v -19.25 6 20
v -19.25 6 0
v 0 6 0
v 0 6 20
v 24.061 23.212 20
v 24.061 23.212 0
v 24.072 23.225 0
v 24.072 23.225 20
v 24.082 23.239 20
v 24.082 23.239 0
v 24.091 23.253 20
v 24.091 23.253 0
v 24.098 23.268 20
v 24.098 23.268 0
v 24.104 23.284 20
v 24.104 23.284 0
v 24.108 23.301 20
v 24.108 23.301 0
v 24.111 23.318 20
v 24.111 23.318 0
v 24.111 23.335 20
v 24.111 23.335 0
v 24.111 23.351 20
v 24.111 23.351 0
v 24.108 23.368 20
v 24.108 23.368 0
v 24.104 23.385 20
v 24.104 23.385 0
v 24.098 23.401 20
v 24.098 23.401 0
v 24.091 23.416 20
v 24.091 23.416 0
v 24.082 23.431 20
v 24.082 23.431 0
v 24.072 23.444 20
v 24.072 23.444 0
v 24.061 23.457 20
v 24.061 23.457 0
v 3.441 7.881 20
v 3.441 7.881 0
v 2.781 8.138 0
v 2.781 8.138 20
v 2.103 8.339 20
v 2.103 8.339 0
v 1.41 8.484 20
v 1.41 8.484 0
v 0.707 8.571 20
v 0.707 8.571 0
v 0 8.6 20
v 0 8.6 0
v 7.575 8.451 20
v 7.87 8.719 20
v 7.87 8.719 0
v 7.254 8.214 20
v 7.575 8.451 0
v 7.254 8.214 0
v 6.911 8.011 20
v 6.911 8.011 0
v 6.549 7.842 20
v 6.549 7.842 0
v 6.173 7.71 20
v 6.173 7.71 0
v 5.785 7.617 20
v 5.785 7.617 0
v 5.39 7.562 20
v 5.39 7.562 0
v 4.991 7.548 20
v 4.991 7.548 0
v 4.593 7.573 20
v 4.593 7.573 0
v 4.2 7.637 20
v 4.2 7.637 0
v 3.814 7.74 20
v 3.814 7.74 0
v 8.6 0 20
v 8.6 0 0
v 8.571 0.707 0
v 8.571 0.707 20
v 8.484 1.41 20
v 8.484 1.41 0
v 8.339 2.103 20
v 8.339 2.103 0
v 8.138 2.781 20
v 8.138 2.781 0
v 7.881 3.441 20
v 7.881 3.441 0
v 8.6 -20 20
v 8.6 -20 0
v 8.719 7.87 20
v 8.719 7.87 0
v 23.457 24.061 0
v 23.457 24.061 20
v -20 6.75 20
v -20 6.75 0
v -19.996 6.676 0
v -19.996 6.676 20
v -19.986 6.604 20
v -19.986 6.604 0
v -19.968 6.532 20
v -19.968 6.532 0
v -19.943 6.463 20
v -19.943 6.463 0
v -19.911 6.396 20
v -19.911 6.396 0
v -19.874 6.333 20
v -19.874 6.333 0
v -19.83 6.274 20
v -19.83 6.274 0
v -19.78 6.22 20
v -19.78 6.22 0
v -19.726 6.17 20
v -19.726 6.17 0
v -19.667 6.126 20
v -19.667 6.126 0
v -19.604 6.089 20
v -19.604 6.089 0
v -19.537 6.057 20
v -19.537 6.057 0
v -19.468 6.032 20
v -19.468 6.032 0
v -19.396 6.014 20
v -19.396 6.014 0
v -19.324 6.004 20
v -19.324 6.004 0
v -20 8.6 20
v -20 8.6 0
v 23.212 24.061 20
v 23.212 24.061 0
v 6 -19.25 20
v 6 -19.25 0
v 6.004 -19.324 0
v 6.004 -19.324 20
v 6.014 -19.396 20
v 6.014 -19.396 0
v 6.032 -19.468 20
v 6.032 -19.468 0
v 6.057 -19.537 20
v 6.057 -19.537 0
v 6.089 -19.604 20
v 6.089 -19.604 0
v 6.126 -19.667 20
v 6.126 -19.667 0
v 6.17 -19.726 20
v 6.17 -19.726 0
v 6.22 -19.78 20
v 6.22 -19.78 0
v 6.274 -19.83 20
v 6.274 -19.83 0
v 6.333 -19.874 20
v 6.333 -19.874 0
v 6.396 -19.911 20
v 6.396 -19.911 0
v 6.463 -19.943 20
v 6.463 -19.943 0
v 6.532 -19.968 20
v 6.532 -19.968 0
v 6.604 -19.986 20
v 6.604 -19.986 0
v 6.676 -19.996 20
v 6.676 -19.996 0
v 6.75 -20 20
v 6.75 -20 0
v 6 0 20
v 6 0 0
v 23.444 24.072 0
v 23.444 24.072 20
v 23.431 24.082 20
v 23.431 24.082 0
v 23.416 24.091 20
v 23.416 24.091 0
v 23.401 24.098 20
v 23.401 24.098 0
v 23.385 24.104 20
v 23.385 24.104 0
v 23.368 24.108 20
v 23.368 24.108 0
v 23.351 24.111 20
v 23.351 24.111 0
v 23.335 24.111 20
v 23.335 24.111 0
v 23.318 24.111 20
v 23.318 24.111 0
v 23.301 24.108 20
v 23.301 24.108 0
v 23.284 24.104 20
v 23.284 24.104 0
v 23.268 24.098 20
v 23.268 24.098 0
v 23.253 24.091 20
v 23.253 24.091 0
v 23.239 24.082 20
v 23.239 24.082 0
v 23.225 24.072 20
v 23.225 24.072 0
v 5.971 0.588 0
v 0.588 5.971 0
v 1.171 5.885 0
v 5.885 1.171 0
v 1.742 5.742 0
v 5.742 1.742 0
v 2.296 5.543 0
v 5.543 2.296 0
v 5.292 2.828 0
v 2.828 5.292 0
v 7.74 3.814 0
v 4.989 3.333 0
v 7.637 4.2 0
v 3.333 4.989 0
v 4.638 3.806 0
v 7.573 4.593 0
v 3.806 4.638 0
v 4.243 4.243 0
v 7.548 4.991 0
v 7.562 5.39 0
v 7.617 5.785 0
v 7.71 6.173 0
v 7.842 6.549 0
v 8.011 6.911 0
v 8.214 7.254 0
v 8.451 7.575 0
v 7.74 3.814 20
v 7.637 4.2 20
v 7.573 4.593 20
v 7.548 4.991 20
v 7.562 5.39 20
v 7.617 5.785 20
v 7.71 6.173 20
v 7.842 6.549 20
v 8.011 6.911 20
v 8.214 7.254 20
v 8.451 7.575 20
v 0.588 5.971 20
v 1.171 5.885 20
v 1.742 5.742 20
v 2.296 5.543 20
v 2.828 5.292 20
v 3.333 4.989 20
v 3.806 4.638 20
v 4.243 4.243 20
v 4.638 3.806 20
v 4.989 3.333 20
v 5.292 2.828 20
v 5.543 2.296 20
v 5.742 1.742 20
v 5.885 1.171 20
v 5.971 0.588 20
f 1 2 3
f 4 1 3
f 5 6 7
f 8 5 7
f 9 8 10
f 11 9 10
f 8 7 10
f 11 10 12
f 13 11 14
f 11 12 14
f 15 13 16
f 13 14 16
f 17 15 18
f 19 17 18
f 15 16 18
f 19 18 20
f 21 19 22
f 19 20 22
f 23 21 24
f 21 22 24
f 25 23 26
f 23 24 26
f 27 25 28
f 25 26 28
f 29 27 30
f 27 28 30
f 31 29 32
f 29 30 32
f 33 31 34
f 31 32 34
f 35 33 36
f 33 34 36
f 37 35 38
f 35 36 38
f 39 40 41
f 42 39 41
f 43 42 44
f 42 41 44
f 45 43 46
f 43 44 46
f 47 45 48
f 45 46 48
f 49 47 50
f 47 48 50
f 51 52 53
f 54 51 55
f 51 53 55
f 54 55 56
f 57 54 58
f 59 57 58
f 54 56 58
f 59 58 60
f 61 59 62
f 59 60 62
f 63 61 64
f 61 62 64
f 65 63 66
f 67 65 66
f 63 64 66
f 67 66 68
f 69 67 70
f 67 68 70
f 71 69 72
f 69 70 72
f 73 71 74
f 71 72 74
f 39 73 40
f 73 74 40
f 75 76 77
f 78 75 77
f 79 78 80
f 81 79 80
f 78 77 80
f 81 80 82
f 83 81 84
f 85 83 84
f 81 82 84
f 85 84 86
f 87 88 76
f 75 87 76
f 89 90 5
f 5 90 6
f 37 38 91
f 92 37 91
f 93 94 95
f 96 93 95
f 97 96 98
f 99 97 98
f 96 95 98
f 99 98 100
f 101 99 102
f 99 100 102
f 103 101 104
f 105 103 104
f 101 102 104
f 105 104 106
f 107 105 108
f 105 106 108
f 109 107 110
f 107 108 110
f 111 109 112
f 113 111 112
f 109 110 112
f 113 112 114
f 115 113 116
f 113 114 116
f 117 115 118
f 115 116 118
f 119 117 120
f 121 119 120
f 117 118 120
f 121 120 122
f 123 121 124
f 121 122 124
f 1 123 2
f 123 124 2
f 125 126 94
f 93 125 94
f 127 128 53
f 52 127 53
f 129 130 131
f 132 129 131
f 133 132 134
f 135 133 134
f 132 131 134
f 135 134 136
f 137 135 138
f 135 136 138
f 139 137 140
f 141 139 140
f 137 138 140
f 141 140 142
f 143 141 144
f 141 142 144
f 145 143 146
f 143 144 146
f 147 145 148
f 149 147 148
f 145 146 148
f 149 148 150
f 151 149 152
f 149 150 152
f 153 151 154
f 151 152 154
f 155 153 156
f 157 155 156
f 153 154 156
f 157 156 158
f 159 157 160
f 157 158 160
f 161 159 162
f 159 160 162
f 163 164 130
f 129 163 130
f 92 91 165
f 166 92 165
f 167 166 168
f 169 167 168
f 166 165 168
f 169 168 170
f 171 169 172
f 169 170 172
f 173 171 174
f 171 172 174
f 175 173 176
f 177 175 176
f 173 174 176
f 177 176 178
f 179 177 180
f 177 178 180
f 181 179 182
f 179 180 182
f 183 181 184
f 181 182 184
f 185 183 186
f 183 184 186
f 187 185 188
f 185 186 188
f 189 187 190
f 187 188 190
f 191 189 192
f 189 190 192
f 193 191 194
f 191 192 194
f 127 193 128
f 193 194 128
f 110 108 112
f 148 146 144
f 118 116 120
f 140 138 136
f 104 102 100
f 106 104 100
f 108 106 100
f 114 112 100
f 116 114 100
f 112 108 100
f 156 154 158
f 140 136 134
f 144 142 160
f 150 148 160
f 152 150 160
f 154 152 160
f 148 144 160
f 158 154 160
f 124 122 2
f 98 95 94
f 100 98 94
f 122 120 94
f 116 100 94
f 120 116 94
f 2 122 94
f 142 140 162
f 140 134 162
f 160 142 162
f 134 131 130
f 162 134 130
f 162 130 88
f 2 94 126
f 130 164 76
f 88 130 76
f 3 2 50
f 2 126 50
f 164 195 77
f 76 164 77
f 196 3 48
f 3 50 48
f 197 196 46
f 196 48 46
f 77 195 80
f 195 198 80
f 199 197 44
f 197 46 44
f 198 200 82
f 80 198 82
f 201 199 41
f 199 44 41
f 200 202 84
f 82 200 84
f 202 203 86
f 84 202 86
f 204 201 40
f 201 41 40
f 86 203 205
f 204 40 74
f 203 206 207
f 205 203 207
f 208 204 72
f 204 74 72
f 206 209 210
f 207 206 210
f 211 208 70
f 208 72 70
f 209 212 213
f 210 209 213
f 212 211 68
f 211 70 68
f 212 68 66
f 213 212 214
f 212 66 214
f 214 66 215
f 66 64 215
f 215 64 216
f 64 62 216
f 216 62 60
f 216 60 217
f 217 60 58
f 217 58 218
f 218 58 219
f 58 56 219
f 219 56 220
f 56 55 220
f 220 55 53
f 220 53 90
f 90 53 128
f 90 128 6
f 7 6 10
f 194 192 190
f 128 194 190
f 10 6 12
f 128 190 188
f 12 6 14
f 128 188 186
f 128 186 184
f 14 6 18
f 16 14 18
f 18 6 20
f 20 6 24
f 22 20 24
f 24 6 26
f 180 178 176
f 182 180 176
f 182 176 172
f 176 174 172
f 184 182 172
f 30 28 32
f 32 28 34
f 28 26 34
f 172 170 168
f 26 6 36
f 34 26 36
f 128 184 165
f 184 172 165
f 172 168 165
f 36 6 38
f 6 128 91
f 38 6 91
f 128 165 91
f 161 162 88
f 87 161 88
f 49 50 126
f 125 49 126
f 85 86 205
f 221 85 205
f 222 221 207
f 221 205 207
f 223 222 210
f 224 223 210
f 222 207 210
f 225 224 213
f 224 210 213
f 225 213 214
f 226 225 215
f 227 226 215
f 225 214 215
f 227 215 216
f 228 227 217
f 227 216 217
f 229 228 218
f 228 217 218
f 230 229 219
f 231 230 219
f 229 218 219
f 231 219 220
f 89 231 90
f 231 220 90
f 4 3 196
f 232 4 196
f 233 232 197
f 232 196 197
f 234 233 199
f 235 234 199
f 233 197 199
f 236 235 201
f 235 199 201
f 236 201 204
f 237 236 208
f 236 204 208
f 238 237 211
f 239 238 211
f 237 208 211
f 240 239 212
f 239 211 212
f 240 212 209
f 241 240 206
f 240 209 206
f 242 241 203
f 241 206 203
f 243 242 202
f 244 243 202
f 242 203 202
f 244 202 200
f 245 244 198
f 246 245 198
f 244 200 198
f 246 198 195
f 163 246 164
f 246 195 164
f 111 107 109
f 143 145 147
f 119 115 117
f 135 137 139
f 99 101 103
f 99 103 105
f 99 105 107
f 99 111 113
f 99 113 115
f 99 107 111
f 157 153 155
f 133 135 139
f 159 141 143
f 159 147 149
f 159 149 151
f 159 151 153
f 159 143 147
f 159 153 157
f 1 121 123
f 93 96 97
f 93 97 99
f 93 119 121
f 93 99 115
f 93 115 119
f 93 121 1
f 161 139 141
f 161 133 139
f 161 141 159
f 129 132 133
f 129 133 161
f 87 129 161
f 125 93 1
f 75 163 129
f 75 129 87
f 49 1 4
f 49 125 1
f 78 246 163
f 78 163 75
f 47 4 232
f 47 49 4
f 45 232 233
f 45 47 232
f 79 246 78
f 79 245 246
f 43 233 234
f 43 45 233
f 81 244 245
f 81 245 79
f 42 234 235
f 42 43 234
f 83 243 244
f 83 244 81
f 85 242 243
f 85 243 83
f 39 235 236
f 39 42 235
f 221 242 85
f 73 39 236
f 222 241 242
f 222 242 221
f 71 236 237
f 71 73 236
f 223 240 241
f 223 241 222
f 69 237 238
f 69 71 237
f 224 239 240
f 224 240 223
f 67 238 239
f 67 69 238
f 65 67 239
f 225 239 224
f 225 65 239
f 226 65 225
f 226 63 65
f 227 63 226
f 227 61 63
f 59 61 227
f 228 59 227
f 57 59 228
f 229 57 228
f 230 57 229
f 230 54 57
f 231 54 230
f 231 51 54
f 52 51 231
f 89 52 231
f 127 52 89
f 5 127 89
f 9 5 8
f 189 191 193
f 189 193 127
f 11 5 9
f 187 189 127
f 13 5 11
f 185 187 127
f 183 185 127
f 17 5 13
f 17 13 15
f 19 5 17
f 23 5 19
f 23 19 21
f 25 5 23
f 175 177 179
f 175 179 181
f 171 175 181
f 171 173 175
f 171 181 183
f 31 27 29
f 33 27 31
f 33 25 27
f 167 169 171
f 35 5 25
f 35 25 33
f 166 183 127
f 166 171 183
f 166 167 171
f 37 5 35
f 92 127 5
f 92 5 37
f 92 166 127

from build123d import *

# Parameters (mm, degrees)
F1_DEPTH = 20


with BuildPart() as f1:
    # F0 (on Top) → F1 (new body)
    with BuildSketch(Plane.XY):
        with BuildLine():
            ThreePointArc((0, 6), (4.242641, 4.242641), (6, 0))
            Line((6, 0), (6, -19.25))
            ThreePointArc((6, -19.25), (6.21967, -19.78033), (6.75, -20))
            Line((6.75, -20), (8.6, -20))
            Line((8.6, -20), (8.6, 0))
            ThreePointArc((8.6, 0), (8.418451, 1.75775), (7.881468, 3.441287))
            ThreePointArc((7.881468, 3.441287), (7.616897, 5.784979), (8.718841, 7.870312))
            Line((8.718841, 7.870312), (24.060858, 23.21233))
            ThreePointArc((24.060858, 23.21233), (24.111472, 23.334524), (24.060858, 23.456718))
            Line((24.060858, 23.456718), (23.758788, 23.758788))
            Line((23.758788, 23.758788), (23.456718, 24.060858))
            ThreePointArc((23.456718, 24.060858), (23.334524, 24.111472), (23.21233, 24.060858))
            Line((23.21233, 24.060858), (7.870312, 8.718841))
            ThreePointArc((7.870312, 8.718841), (5.784979, 7.616897), (3.441287, 7.881468))
            ThreePointArc((3.441287, 7.881468), (1.75775, 8.418451), (0, 8.6))
            Line((0, 8.6), (-20, 8.6))
            Line((-20, 8.6), (-20, 6.75))
            ThreePointArc((-20, 6.75), (-19.78033, 6.21967), (-19.25, 6))
            Line((-19.25, 6), (0, 6))
        make_face()
    extrude(amount=F1_DEPTH)


solid = f1.part
